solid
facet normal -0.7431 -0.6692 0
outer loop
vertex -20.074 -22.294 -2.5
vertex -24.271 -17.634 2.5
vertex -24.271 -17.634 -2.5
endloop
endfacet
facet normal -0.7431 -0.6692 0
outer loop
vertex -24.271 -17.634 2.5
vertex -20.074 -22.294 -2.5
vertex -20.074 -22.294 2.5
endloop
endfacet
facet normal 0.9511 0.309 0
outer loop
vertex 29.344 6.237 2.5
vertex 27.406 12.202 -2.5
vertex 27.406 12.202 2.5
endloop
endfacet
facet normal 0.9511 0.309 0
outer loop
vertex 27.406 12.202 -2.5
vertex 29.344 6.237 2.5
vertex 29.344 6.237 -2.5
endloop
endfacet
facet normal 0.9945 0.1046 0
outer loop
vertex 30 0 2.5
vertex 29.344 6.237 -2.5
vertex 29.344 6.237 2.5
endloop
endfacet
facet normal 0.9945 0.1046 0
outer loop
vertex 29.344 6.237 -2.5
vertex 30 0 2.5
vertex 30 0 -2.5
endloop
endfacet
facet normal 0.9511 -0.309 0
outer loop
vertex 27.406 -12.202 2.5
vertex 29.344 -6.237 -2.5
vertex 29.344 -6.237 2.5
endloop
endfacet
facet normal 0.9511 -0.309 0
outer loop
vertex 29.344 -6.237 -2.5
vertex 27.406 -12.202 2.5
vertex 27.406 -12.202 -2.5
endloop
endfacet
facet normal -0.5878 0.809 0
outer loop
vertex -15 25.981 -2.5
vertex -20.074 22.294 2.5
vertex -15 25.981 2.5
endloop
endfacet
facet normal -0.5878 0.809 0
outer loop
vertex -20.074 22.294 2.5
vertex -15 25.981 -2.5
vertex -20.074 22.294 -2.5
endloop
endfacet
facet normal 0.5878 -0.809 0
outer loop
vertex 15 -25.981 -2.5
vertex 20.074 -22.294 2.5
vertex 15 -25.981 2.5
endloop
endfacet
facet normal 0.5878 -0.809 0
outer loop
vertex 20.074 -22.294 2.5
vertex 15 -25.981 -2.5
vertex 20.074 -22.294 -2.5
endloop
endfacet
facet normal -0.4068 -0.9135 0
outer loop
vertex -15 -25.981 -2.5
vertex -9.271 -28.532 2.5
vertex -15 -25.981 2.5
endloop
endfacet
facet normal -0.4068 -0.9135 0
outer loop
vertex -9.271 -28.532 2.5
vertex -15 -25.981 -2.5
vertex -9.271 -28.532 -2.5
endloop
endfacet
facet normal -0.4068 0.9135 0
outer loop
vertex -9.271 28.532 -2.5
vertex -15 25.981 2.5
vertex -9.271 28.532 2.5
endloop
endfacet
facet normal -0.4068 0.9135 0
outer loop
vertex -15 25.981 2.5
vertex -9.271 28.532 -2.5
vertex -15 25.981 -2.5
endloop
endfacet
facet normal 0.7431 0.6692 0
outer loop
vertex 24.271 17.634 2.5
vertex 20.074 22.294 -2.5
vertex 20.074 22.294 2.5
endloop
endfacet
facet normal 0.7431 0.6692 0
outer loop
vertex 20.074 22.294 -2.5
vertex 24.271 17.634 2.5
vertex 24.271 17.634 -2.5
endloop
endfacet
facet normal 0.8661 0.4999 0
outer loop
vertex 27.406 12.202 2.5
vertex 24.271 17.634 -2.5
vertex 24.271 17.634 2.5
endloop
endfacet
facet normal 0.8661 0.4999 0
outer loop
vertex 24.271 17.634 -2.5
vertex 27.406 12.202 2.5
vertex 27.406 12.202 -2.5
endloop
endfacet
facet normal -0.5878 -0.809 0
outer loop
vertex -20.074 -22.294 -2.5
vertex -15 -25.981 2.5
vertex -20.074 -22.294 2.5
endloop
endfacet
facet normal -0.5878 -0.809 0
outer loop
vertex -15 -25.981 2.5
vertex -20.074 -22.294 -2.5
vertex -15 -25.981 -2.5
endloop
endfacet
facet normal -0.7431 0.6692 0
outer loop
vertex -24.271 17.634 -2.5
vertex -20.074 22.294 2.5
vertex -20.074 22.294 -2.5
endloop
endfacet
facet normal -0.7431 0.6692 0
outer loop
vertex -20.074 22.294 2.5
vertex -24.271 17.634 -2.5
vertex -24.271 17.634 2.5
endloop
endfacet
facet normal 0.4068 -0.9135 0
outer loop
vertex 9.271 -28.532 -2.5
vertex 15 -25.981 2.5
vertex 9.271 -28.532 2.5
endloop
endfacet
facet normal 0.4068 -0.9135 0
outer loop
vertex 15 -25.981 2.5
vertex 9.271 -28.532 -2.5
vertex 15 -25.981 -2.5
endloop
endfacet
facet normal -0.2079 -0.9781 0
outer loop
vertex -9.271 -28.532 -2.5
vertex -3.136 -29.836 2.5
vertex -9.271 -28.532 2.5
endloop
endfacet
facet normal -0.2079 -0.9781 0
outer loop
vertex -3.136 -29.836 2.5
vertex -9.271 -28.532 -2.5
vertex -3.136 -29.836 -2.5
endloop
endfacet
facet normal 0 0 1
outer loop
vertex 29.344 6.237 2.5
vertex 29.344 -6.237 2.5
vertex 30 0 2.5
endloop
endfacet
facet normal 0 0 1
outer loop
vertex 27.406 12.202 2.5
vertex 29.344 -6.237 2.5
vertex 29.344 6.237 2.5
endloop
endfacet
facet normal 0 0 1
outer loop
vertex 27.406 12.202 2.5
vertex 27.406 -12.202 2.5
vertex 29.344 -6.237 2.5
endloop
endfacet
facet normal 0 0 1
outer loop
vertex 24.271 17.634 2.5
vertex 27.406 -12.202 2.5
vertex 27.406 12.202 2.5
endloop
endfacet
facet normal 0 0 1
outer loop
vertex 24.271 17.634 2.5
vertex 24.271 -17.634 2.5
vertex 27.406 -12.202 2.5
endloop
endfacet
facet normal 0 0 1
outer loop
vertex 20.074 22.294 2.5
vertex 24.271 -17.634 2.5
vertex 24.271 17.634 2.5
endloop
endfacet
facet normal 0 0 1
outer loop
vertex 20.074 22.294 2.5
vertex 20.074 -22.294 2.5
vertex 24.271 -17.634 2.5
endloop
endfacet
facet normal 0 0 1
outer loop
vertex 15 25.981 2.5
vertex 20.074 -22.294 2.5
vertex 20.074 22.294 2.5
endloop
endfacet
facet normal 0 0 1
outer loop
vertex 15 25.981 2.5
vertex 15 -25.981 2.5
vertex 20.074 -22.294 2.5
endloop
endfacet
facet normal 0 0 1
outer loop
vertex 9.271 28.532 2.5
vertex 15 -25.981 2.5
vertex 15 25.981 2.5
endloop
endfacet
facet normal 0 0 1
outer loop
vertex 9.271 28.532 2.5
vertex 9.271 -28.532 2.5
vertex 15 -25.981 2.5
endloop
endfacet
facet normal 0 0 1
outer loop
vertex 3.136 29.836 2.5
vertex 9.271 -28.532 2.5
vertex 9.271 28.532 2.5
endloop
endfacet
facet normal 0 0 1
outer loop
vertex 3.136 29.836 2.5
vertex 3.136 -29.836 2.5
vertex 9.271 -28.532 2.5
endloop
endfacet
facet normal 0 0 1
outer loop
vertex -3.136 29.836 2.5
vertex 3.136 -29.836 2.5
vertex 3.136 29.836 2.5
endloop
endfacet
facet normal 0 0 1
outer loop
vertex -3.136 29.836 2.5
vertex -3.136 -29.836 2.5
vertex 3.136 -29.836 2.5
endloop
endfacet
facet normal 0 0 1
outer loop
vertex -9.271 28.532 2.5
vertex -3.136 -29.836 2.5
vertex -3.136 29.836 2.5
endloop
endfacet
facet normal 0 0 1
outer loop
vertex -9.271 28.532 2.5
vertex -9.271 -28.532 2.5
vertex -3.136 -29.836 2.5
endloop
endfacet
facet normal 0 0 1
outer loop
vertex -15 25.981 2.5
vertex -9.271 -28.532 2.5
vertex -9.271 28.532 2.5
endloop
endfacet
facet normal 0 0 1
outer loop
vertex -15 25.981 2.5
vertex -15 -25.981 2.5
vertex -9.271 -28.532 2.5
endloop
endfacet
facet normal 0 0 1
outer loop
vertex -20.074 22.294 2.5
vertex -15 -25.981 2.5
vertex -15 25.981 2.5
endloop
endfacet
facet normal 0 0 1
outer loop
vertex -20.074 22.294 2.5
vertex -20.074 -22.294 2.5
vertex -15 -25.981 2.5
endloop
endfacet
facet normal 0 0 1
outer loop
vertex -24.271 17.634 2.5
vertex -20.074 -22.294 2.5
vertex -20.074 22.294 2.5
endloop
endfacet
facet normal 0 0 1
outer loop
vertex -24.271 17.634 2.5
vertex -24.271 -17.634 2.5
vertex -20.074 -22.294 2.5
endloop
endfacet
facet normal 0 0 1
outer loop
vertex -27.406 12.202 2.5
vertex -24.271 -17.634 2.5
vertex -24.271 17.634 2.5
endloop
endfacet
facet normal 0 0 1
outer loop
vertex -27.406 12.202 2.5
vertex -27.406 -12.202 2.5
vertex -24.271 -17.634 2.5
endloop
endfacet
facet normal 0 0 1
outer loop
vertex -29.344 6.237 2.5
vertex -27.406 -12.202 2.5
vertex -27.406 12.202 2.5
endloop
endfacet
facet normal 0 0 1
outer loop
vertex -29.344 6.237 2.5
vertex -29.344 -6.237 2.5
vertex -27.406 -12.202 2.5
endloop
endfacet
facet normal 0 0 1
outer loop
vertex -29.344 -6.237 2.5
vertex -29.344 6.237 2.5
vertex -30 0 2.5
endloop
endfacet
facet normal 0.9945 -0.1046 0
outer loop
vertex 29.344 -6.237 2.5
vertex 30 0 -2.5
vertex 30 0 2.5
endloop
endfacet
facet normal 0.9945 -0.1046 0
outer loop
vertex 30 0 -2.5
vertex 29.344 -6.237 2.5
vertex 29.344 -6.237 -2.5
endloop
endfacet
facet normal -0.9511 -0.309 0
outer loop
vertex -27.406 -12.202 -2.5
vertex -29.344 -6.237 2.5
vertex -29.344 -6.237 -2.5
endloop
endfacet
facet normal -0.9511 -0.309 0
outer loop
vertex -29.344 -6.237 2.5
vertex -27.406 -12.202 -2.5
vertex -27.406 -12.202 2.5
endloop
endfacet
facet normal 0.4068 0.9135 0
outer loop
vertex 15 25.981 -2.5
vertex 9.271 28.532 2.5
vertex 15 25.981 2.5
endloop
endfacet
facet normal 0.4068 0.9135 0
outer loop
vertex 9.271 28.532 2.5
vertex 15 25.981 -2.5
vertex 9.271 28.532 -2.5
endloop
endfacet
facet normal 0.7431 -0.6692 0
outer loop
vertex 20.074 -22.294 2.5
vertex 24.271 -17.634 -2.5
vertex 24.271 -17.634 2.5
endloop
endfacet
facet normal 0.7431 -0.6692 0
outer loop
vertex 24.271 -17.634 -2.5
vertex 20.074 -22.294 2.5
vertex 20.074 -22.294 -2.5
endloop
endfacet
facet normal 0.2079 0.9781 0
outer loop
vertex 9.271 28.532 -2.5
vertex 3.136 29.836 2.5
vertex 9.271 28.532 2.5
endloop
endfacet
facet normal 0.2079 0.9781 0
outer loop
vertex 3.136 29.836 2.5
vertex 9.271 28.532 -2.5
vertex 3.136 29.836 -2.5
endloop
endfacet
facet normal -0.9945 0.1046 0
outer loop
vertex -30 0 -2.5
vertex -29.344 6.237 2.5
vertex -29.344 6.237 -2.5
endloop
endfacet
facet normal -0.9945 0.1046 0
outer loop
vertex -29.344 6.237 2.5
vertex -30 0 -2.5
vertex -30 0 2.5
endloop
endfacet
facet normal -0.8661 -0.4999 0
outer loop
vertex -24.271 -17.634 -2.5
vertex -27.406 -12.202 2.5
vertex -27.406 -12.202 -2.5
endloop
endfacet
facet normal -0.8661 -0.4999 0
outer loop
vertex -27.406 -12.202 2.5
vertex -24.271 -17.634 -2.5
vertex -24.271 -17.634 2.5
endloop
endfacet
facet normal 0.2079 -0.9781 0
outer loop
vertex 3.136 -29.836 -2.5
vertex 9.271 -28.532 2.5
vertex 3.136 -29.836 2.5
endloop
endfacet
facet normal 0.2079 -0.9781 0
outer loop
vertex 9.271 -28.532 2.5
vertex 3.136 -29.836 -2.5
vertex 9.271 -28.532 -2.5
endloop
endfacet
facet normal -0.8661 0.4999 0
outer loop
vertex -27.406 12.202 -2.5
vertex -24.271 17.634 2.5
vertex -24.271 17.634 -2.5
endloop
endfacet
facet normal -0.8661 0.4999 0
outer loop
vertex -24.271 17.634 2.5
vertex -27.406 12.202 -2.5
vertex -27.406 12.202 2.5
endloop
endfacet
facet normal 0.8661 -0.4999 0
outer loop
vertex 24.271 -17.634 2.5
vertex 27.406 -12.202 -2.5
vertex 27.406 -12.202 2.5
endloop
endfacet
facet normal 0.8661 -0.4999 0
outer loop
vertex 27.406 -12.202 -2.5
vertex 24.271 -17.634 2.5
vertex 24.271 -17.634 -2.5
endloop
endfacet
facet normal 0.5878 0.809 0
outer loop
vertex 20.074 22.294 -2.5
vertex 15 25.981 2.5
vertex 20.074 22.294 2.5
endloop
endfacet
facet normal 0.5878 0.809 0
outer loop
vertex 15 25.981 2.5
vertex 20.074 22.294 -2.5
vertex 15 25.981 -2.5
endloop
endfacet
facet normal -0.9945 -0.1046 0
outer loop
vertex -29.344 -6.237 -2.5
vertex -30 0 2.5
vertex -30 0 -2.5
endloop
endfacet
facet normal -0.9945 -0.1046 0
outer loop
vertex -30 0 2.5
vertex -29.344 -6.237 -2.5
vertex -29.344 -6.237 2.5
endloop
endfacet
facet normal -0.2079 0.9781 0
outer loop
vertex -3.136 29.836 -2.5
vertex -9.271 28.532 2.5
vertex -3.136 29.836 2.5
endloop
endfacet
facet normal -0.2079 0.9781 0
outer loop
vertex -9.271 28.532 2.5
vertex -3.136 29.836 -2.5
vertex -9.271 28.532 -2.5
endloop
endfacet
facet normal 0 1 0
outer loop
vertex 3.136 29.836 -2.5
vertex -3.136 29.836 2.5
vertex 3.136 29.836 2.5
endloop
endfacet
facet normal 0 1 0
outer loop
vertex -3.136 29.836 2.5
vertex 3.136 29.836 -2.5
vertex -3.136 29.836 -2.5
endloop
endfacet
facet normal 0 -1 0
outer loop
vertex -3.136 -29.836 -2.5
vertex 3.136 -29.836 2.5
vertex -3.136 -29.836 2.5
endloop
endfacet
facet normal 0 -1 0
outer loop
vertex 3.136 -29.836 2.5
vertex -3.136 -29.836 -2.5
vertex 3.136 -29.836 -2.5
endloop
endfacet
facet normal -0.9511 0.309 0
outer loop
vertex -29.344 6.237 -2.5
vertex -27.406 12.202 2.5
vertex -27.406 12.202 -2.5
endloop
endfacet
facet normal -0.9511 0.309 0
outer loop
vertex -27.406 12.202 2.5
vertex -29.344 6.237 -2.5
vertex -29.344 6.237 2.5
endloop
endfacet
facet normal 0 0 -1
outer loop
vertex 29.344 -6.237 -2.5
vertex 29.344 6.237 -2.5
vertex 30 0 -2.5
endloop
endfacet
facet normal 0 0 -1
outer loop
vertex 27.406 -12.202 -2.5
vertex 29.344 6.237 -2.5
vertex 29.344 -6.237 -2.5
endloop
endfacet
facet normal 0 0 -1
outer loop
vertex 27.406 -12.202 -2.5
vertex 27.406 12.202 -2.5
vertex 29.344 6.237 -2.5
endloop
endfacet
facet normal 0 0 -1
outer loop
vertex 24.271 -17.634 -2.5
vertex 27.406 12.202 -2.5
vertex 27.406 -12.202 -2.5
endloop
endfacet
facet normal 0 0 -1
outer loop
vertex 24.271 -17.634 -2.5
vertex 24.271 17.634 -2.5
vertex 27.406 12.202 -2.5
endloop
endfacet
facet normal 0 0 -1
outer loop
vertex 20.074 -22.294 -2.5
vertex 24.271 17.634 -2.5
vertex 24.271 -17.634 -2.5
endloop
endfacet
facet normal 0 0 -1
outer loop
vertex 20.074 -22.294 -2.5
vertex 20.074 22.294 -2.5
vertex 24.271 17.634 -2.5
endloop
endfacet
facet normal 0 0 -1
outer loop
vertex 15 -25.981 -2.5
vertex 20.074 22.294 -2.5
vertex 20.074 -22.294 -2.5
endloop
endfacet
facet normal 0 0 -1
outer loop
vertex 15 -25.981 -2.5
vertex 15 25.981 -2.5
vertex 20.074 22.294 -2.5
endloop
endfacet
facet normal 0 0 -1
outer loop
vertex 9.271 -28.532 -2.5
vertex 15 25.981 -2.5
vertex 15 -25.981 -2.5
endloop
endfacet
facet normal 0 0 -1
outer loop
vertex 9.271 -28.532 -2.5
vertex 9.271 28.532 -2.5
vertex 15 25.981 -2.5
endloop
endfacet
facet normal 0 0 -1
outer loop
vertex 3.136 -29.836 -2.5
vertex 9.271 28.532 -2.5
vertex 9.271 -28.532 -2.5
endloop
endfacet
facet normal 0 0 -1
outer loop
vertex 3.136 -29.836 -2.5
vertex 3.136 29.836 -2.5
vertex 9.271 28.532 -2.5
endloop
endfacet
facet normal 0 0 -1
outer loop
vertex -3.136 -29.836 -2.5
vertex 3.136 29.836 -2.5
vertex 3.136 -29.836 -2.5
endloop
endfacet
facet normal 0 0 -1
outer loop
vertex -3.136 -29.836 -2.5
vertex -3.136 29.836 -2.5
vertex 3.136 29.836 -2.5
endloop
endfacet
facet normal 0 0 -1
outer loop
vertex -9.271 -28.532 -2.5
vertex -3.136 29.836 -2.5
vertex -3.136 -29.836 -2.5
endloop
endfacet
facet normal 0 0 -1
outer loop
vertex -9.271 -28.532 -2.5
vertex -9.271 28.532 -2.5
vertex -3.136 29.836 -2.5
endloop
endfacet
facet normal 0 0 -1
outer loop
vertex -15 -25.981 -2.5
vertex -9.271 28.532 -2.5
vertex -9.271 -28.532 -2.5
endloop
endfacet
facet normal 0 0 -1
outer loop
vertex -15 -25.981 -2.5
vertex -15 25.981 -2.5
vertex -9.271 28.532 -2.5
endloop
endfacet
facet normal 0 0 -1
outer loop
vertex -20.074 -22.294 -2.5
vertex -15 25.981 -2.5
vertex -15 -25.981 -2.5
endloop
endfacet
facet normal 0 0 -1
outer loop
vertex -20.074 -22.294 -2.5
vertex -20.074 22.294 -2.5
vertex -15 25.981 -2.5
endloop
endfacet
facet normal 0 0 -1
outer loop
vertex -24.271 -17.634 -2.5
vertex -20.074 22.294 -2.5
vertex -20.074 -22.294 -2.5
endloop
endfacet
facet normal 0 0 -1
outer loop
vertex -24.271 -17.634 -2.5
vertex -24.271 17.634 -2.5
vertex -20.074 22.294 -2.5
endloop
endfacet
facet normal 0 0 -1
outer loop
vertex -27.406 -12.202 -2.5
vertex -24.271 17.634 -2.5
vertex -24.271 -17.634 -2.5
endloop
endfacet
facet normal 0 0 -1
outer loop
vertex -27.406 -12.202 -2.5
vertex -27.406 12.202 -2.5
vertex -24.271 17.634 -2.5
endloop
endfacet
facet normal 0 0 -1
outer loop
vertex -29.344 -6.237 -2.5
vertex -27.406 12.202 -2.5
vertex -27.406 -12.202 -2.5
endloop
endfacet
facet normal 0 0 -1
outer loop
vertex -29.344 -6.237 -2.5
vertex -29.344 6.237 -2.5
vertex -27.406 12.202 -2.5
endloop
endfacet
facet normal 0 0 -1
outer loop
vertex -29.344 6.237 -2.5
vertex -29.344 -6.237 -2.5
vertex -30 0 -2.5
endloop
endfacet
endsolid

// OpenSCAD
difference() { cylinder(h=5, r=30, center=true); translate([0, 0, 1]) color("red") text("A B C O U", size=8, halign="center", valign="center", $fn=100); }
